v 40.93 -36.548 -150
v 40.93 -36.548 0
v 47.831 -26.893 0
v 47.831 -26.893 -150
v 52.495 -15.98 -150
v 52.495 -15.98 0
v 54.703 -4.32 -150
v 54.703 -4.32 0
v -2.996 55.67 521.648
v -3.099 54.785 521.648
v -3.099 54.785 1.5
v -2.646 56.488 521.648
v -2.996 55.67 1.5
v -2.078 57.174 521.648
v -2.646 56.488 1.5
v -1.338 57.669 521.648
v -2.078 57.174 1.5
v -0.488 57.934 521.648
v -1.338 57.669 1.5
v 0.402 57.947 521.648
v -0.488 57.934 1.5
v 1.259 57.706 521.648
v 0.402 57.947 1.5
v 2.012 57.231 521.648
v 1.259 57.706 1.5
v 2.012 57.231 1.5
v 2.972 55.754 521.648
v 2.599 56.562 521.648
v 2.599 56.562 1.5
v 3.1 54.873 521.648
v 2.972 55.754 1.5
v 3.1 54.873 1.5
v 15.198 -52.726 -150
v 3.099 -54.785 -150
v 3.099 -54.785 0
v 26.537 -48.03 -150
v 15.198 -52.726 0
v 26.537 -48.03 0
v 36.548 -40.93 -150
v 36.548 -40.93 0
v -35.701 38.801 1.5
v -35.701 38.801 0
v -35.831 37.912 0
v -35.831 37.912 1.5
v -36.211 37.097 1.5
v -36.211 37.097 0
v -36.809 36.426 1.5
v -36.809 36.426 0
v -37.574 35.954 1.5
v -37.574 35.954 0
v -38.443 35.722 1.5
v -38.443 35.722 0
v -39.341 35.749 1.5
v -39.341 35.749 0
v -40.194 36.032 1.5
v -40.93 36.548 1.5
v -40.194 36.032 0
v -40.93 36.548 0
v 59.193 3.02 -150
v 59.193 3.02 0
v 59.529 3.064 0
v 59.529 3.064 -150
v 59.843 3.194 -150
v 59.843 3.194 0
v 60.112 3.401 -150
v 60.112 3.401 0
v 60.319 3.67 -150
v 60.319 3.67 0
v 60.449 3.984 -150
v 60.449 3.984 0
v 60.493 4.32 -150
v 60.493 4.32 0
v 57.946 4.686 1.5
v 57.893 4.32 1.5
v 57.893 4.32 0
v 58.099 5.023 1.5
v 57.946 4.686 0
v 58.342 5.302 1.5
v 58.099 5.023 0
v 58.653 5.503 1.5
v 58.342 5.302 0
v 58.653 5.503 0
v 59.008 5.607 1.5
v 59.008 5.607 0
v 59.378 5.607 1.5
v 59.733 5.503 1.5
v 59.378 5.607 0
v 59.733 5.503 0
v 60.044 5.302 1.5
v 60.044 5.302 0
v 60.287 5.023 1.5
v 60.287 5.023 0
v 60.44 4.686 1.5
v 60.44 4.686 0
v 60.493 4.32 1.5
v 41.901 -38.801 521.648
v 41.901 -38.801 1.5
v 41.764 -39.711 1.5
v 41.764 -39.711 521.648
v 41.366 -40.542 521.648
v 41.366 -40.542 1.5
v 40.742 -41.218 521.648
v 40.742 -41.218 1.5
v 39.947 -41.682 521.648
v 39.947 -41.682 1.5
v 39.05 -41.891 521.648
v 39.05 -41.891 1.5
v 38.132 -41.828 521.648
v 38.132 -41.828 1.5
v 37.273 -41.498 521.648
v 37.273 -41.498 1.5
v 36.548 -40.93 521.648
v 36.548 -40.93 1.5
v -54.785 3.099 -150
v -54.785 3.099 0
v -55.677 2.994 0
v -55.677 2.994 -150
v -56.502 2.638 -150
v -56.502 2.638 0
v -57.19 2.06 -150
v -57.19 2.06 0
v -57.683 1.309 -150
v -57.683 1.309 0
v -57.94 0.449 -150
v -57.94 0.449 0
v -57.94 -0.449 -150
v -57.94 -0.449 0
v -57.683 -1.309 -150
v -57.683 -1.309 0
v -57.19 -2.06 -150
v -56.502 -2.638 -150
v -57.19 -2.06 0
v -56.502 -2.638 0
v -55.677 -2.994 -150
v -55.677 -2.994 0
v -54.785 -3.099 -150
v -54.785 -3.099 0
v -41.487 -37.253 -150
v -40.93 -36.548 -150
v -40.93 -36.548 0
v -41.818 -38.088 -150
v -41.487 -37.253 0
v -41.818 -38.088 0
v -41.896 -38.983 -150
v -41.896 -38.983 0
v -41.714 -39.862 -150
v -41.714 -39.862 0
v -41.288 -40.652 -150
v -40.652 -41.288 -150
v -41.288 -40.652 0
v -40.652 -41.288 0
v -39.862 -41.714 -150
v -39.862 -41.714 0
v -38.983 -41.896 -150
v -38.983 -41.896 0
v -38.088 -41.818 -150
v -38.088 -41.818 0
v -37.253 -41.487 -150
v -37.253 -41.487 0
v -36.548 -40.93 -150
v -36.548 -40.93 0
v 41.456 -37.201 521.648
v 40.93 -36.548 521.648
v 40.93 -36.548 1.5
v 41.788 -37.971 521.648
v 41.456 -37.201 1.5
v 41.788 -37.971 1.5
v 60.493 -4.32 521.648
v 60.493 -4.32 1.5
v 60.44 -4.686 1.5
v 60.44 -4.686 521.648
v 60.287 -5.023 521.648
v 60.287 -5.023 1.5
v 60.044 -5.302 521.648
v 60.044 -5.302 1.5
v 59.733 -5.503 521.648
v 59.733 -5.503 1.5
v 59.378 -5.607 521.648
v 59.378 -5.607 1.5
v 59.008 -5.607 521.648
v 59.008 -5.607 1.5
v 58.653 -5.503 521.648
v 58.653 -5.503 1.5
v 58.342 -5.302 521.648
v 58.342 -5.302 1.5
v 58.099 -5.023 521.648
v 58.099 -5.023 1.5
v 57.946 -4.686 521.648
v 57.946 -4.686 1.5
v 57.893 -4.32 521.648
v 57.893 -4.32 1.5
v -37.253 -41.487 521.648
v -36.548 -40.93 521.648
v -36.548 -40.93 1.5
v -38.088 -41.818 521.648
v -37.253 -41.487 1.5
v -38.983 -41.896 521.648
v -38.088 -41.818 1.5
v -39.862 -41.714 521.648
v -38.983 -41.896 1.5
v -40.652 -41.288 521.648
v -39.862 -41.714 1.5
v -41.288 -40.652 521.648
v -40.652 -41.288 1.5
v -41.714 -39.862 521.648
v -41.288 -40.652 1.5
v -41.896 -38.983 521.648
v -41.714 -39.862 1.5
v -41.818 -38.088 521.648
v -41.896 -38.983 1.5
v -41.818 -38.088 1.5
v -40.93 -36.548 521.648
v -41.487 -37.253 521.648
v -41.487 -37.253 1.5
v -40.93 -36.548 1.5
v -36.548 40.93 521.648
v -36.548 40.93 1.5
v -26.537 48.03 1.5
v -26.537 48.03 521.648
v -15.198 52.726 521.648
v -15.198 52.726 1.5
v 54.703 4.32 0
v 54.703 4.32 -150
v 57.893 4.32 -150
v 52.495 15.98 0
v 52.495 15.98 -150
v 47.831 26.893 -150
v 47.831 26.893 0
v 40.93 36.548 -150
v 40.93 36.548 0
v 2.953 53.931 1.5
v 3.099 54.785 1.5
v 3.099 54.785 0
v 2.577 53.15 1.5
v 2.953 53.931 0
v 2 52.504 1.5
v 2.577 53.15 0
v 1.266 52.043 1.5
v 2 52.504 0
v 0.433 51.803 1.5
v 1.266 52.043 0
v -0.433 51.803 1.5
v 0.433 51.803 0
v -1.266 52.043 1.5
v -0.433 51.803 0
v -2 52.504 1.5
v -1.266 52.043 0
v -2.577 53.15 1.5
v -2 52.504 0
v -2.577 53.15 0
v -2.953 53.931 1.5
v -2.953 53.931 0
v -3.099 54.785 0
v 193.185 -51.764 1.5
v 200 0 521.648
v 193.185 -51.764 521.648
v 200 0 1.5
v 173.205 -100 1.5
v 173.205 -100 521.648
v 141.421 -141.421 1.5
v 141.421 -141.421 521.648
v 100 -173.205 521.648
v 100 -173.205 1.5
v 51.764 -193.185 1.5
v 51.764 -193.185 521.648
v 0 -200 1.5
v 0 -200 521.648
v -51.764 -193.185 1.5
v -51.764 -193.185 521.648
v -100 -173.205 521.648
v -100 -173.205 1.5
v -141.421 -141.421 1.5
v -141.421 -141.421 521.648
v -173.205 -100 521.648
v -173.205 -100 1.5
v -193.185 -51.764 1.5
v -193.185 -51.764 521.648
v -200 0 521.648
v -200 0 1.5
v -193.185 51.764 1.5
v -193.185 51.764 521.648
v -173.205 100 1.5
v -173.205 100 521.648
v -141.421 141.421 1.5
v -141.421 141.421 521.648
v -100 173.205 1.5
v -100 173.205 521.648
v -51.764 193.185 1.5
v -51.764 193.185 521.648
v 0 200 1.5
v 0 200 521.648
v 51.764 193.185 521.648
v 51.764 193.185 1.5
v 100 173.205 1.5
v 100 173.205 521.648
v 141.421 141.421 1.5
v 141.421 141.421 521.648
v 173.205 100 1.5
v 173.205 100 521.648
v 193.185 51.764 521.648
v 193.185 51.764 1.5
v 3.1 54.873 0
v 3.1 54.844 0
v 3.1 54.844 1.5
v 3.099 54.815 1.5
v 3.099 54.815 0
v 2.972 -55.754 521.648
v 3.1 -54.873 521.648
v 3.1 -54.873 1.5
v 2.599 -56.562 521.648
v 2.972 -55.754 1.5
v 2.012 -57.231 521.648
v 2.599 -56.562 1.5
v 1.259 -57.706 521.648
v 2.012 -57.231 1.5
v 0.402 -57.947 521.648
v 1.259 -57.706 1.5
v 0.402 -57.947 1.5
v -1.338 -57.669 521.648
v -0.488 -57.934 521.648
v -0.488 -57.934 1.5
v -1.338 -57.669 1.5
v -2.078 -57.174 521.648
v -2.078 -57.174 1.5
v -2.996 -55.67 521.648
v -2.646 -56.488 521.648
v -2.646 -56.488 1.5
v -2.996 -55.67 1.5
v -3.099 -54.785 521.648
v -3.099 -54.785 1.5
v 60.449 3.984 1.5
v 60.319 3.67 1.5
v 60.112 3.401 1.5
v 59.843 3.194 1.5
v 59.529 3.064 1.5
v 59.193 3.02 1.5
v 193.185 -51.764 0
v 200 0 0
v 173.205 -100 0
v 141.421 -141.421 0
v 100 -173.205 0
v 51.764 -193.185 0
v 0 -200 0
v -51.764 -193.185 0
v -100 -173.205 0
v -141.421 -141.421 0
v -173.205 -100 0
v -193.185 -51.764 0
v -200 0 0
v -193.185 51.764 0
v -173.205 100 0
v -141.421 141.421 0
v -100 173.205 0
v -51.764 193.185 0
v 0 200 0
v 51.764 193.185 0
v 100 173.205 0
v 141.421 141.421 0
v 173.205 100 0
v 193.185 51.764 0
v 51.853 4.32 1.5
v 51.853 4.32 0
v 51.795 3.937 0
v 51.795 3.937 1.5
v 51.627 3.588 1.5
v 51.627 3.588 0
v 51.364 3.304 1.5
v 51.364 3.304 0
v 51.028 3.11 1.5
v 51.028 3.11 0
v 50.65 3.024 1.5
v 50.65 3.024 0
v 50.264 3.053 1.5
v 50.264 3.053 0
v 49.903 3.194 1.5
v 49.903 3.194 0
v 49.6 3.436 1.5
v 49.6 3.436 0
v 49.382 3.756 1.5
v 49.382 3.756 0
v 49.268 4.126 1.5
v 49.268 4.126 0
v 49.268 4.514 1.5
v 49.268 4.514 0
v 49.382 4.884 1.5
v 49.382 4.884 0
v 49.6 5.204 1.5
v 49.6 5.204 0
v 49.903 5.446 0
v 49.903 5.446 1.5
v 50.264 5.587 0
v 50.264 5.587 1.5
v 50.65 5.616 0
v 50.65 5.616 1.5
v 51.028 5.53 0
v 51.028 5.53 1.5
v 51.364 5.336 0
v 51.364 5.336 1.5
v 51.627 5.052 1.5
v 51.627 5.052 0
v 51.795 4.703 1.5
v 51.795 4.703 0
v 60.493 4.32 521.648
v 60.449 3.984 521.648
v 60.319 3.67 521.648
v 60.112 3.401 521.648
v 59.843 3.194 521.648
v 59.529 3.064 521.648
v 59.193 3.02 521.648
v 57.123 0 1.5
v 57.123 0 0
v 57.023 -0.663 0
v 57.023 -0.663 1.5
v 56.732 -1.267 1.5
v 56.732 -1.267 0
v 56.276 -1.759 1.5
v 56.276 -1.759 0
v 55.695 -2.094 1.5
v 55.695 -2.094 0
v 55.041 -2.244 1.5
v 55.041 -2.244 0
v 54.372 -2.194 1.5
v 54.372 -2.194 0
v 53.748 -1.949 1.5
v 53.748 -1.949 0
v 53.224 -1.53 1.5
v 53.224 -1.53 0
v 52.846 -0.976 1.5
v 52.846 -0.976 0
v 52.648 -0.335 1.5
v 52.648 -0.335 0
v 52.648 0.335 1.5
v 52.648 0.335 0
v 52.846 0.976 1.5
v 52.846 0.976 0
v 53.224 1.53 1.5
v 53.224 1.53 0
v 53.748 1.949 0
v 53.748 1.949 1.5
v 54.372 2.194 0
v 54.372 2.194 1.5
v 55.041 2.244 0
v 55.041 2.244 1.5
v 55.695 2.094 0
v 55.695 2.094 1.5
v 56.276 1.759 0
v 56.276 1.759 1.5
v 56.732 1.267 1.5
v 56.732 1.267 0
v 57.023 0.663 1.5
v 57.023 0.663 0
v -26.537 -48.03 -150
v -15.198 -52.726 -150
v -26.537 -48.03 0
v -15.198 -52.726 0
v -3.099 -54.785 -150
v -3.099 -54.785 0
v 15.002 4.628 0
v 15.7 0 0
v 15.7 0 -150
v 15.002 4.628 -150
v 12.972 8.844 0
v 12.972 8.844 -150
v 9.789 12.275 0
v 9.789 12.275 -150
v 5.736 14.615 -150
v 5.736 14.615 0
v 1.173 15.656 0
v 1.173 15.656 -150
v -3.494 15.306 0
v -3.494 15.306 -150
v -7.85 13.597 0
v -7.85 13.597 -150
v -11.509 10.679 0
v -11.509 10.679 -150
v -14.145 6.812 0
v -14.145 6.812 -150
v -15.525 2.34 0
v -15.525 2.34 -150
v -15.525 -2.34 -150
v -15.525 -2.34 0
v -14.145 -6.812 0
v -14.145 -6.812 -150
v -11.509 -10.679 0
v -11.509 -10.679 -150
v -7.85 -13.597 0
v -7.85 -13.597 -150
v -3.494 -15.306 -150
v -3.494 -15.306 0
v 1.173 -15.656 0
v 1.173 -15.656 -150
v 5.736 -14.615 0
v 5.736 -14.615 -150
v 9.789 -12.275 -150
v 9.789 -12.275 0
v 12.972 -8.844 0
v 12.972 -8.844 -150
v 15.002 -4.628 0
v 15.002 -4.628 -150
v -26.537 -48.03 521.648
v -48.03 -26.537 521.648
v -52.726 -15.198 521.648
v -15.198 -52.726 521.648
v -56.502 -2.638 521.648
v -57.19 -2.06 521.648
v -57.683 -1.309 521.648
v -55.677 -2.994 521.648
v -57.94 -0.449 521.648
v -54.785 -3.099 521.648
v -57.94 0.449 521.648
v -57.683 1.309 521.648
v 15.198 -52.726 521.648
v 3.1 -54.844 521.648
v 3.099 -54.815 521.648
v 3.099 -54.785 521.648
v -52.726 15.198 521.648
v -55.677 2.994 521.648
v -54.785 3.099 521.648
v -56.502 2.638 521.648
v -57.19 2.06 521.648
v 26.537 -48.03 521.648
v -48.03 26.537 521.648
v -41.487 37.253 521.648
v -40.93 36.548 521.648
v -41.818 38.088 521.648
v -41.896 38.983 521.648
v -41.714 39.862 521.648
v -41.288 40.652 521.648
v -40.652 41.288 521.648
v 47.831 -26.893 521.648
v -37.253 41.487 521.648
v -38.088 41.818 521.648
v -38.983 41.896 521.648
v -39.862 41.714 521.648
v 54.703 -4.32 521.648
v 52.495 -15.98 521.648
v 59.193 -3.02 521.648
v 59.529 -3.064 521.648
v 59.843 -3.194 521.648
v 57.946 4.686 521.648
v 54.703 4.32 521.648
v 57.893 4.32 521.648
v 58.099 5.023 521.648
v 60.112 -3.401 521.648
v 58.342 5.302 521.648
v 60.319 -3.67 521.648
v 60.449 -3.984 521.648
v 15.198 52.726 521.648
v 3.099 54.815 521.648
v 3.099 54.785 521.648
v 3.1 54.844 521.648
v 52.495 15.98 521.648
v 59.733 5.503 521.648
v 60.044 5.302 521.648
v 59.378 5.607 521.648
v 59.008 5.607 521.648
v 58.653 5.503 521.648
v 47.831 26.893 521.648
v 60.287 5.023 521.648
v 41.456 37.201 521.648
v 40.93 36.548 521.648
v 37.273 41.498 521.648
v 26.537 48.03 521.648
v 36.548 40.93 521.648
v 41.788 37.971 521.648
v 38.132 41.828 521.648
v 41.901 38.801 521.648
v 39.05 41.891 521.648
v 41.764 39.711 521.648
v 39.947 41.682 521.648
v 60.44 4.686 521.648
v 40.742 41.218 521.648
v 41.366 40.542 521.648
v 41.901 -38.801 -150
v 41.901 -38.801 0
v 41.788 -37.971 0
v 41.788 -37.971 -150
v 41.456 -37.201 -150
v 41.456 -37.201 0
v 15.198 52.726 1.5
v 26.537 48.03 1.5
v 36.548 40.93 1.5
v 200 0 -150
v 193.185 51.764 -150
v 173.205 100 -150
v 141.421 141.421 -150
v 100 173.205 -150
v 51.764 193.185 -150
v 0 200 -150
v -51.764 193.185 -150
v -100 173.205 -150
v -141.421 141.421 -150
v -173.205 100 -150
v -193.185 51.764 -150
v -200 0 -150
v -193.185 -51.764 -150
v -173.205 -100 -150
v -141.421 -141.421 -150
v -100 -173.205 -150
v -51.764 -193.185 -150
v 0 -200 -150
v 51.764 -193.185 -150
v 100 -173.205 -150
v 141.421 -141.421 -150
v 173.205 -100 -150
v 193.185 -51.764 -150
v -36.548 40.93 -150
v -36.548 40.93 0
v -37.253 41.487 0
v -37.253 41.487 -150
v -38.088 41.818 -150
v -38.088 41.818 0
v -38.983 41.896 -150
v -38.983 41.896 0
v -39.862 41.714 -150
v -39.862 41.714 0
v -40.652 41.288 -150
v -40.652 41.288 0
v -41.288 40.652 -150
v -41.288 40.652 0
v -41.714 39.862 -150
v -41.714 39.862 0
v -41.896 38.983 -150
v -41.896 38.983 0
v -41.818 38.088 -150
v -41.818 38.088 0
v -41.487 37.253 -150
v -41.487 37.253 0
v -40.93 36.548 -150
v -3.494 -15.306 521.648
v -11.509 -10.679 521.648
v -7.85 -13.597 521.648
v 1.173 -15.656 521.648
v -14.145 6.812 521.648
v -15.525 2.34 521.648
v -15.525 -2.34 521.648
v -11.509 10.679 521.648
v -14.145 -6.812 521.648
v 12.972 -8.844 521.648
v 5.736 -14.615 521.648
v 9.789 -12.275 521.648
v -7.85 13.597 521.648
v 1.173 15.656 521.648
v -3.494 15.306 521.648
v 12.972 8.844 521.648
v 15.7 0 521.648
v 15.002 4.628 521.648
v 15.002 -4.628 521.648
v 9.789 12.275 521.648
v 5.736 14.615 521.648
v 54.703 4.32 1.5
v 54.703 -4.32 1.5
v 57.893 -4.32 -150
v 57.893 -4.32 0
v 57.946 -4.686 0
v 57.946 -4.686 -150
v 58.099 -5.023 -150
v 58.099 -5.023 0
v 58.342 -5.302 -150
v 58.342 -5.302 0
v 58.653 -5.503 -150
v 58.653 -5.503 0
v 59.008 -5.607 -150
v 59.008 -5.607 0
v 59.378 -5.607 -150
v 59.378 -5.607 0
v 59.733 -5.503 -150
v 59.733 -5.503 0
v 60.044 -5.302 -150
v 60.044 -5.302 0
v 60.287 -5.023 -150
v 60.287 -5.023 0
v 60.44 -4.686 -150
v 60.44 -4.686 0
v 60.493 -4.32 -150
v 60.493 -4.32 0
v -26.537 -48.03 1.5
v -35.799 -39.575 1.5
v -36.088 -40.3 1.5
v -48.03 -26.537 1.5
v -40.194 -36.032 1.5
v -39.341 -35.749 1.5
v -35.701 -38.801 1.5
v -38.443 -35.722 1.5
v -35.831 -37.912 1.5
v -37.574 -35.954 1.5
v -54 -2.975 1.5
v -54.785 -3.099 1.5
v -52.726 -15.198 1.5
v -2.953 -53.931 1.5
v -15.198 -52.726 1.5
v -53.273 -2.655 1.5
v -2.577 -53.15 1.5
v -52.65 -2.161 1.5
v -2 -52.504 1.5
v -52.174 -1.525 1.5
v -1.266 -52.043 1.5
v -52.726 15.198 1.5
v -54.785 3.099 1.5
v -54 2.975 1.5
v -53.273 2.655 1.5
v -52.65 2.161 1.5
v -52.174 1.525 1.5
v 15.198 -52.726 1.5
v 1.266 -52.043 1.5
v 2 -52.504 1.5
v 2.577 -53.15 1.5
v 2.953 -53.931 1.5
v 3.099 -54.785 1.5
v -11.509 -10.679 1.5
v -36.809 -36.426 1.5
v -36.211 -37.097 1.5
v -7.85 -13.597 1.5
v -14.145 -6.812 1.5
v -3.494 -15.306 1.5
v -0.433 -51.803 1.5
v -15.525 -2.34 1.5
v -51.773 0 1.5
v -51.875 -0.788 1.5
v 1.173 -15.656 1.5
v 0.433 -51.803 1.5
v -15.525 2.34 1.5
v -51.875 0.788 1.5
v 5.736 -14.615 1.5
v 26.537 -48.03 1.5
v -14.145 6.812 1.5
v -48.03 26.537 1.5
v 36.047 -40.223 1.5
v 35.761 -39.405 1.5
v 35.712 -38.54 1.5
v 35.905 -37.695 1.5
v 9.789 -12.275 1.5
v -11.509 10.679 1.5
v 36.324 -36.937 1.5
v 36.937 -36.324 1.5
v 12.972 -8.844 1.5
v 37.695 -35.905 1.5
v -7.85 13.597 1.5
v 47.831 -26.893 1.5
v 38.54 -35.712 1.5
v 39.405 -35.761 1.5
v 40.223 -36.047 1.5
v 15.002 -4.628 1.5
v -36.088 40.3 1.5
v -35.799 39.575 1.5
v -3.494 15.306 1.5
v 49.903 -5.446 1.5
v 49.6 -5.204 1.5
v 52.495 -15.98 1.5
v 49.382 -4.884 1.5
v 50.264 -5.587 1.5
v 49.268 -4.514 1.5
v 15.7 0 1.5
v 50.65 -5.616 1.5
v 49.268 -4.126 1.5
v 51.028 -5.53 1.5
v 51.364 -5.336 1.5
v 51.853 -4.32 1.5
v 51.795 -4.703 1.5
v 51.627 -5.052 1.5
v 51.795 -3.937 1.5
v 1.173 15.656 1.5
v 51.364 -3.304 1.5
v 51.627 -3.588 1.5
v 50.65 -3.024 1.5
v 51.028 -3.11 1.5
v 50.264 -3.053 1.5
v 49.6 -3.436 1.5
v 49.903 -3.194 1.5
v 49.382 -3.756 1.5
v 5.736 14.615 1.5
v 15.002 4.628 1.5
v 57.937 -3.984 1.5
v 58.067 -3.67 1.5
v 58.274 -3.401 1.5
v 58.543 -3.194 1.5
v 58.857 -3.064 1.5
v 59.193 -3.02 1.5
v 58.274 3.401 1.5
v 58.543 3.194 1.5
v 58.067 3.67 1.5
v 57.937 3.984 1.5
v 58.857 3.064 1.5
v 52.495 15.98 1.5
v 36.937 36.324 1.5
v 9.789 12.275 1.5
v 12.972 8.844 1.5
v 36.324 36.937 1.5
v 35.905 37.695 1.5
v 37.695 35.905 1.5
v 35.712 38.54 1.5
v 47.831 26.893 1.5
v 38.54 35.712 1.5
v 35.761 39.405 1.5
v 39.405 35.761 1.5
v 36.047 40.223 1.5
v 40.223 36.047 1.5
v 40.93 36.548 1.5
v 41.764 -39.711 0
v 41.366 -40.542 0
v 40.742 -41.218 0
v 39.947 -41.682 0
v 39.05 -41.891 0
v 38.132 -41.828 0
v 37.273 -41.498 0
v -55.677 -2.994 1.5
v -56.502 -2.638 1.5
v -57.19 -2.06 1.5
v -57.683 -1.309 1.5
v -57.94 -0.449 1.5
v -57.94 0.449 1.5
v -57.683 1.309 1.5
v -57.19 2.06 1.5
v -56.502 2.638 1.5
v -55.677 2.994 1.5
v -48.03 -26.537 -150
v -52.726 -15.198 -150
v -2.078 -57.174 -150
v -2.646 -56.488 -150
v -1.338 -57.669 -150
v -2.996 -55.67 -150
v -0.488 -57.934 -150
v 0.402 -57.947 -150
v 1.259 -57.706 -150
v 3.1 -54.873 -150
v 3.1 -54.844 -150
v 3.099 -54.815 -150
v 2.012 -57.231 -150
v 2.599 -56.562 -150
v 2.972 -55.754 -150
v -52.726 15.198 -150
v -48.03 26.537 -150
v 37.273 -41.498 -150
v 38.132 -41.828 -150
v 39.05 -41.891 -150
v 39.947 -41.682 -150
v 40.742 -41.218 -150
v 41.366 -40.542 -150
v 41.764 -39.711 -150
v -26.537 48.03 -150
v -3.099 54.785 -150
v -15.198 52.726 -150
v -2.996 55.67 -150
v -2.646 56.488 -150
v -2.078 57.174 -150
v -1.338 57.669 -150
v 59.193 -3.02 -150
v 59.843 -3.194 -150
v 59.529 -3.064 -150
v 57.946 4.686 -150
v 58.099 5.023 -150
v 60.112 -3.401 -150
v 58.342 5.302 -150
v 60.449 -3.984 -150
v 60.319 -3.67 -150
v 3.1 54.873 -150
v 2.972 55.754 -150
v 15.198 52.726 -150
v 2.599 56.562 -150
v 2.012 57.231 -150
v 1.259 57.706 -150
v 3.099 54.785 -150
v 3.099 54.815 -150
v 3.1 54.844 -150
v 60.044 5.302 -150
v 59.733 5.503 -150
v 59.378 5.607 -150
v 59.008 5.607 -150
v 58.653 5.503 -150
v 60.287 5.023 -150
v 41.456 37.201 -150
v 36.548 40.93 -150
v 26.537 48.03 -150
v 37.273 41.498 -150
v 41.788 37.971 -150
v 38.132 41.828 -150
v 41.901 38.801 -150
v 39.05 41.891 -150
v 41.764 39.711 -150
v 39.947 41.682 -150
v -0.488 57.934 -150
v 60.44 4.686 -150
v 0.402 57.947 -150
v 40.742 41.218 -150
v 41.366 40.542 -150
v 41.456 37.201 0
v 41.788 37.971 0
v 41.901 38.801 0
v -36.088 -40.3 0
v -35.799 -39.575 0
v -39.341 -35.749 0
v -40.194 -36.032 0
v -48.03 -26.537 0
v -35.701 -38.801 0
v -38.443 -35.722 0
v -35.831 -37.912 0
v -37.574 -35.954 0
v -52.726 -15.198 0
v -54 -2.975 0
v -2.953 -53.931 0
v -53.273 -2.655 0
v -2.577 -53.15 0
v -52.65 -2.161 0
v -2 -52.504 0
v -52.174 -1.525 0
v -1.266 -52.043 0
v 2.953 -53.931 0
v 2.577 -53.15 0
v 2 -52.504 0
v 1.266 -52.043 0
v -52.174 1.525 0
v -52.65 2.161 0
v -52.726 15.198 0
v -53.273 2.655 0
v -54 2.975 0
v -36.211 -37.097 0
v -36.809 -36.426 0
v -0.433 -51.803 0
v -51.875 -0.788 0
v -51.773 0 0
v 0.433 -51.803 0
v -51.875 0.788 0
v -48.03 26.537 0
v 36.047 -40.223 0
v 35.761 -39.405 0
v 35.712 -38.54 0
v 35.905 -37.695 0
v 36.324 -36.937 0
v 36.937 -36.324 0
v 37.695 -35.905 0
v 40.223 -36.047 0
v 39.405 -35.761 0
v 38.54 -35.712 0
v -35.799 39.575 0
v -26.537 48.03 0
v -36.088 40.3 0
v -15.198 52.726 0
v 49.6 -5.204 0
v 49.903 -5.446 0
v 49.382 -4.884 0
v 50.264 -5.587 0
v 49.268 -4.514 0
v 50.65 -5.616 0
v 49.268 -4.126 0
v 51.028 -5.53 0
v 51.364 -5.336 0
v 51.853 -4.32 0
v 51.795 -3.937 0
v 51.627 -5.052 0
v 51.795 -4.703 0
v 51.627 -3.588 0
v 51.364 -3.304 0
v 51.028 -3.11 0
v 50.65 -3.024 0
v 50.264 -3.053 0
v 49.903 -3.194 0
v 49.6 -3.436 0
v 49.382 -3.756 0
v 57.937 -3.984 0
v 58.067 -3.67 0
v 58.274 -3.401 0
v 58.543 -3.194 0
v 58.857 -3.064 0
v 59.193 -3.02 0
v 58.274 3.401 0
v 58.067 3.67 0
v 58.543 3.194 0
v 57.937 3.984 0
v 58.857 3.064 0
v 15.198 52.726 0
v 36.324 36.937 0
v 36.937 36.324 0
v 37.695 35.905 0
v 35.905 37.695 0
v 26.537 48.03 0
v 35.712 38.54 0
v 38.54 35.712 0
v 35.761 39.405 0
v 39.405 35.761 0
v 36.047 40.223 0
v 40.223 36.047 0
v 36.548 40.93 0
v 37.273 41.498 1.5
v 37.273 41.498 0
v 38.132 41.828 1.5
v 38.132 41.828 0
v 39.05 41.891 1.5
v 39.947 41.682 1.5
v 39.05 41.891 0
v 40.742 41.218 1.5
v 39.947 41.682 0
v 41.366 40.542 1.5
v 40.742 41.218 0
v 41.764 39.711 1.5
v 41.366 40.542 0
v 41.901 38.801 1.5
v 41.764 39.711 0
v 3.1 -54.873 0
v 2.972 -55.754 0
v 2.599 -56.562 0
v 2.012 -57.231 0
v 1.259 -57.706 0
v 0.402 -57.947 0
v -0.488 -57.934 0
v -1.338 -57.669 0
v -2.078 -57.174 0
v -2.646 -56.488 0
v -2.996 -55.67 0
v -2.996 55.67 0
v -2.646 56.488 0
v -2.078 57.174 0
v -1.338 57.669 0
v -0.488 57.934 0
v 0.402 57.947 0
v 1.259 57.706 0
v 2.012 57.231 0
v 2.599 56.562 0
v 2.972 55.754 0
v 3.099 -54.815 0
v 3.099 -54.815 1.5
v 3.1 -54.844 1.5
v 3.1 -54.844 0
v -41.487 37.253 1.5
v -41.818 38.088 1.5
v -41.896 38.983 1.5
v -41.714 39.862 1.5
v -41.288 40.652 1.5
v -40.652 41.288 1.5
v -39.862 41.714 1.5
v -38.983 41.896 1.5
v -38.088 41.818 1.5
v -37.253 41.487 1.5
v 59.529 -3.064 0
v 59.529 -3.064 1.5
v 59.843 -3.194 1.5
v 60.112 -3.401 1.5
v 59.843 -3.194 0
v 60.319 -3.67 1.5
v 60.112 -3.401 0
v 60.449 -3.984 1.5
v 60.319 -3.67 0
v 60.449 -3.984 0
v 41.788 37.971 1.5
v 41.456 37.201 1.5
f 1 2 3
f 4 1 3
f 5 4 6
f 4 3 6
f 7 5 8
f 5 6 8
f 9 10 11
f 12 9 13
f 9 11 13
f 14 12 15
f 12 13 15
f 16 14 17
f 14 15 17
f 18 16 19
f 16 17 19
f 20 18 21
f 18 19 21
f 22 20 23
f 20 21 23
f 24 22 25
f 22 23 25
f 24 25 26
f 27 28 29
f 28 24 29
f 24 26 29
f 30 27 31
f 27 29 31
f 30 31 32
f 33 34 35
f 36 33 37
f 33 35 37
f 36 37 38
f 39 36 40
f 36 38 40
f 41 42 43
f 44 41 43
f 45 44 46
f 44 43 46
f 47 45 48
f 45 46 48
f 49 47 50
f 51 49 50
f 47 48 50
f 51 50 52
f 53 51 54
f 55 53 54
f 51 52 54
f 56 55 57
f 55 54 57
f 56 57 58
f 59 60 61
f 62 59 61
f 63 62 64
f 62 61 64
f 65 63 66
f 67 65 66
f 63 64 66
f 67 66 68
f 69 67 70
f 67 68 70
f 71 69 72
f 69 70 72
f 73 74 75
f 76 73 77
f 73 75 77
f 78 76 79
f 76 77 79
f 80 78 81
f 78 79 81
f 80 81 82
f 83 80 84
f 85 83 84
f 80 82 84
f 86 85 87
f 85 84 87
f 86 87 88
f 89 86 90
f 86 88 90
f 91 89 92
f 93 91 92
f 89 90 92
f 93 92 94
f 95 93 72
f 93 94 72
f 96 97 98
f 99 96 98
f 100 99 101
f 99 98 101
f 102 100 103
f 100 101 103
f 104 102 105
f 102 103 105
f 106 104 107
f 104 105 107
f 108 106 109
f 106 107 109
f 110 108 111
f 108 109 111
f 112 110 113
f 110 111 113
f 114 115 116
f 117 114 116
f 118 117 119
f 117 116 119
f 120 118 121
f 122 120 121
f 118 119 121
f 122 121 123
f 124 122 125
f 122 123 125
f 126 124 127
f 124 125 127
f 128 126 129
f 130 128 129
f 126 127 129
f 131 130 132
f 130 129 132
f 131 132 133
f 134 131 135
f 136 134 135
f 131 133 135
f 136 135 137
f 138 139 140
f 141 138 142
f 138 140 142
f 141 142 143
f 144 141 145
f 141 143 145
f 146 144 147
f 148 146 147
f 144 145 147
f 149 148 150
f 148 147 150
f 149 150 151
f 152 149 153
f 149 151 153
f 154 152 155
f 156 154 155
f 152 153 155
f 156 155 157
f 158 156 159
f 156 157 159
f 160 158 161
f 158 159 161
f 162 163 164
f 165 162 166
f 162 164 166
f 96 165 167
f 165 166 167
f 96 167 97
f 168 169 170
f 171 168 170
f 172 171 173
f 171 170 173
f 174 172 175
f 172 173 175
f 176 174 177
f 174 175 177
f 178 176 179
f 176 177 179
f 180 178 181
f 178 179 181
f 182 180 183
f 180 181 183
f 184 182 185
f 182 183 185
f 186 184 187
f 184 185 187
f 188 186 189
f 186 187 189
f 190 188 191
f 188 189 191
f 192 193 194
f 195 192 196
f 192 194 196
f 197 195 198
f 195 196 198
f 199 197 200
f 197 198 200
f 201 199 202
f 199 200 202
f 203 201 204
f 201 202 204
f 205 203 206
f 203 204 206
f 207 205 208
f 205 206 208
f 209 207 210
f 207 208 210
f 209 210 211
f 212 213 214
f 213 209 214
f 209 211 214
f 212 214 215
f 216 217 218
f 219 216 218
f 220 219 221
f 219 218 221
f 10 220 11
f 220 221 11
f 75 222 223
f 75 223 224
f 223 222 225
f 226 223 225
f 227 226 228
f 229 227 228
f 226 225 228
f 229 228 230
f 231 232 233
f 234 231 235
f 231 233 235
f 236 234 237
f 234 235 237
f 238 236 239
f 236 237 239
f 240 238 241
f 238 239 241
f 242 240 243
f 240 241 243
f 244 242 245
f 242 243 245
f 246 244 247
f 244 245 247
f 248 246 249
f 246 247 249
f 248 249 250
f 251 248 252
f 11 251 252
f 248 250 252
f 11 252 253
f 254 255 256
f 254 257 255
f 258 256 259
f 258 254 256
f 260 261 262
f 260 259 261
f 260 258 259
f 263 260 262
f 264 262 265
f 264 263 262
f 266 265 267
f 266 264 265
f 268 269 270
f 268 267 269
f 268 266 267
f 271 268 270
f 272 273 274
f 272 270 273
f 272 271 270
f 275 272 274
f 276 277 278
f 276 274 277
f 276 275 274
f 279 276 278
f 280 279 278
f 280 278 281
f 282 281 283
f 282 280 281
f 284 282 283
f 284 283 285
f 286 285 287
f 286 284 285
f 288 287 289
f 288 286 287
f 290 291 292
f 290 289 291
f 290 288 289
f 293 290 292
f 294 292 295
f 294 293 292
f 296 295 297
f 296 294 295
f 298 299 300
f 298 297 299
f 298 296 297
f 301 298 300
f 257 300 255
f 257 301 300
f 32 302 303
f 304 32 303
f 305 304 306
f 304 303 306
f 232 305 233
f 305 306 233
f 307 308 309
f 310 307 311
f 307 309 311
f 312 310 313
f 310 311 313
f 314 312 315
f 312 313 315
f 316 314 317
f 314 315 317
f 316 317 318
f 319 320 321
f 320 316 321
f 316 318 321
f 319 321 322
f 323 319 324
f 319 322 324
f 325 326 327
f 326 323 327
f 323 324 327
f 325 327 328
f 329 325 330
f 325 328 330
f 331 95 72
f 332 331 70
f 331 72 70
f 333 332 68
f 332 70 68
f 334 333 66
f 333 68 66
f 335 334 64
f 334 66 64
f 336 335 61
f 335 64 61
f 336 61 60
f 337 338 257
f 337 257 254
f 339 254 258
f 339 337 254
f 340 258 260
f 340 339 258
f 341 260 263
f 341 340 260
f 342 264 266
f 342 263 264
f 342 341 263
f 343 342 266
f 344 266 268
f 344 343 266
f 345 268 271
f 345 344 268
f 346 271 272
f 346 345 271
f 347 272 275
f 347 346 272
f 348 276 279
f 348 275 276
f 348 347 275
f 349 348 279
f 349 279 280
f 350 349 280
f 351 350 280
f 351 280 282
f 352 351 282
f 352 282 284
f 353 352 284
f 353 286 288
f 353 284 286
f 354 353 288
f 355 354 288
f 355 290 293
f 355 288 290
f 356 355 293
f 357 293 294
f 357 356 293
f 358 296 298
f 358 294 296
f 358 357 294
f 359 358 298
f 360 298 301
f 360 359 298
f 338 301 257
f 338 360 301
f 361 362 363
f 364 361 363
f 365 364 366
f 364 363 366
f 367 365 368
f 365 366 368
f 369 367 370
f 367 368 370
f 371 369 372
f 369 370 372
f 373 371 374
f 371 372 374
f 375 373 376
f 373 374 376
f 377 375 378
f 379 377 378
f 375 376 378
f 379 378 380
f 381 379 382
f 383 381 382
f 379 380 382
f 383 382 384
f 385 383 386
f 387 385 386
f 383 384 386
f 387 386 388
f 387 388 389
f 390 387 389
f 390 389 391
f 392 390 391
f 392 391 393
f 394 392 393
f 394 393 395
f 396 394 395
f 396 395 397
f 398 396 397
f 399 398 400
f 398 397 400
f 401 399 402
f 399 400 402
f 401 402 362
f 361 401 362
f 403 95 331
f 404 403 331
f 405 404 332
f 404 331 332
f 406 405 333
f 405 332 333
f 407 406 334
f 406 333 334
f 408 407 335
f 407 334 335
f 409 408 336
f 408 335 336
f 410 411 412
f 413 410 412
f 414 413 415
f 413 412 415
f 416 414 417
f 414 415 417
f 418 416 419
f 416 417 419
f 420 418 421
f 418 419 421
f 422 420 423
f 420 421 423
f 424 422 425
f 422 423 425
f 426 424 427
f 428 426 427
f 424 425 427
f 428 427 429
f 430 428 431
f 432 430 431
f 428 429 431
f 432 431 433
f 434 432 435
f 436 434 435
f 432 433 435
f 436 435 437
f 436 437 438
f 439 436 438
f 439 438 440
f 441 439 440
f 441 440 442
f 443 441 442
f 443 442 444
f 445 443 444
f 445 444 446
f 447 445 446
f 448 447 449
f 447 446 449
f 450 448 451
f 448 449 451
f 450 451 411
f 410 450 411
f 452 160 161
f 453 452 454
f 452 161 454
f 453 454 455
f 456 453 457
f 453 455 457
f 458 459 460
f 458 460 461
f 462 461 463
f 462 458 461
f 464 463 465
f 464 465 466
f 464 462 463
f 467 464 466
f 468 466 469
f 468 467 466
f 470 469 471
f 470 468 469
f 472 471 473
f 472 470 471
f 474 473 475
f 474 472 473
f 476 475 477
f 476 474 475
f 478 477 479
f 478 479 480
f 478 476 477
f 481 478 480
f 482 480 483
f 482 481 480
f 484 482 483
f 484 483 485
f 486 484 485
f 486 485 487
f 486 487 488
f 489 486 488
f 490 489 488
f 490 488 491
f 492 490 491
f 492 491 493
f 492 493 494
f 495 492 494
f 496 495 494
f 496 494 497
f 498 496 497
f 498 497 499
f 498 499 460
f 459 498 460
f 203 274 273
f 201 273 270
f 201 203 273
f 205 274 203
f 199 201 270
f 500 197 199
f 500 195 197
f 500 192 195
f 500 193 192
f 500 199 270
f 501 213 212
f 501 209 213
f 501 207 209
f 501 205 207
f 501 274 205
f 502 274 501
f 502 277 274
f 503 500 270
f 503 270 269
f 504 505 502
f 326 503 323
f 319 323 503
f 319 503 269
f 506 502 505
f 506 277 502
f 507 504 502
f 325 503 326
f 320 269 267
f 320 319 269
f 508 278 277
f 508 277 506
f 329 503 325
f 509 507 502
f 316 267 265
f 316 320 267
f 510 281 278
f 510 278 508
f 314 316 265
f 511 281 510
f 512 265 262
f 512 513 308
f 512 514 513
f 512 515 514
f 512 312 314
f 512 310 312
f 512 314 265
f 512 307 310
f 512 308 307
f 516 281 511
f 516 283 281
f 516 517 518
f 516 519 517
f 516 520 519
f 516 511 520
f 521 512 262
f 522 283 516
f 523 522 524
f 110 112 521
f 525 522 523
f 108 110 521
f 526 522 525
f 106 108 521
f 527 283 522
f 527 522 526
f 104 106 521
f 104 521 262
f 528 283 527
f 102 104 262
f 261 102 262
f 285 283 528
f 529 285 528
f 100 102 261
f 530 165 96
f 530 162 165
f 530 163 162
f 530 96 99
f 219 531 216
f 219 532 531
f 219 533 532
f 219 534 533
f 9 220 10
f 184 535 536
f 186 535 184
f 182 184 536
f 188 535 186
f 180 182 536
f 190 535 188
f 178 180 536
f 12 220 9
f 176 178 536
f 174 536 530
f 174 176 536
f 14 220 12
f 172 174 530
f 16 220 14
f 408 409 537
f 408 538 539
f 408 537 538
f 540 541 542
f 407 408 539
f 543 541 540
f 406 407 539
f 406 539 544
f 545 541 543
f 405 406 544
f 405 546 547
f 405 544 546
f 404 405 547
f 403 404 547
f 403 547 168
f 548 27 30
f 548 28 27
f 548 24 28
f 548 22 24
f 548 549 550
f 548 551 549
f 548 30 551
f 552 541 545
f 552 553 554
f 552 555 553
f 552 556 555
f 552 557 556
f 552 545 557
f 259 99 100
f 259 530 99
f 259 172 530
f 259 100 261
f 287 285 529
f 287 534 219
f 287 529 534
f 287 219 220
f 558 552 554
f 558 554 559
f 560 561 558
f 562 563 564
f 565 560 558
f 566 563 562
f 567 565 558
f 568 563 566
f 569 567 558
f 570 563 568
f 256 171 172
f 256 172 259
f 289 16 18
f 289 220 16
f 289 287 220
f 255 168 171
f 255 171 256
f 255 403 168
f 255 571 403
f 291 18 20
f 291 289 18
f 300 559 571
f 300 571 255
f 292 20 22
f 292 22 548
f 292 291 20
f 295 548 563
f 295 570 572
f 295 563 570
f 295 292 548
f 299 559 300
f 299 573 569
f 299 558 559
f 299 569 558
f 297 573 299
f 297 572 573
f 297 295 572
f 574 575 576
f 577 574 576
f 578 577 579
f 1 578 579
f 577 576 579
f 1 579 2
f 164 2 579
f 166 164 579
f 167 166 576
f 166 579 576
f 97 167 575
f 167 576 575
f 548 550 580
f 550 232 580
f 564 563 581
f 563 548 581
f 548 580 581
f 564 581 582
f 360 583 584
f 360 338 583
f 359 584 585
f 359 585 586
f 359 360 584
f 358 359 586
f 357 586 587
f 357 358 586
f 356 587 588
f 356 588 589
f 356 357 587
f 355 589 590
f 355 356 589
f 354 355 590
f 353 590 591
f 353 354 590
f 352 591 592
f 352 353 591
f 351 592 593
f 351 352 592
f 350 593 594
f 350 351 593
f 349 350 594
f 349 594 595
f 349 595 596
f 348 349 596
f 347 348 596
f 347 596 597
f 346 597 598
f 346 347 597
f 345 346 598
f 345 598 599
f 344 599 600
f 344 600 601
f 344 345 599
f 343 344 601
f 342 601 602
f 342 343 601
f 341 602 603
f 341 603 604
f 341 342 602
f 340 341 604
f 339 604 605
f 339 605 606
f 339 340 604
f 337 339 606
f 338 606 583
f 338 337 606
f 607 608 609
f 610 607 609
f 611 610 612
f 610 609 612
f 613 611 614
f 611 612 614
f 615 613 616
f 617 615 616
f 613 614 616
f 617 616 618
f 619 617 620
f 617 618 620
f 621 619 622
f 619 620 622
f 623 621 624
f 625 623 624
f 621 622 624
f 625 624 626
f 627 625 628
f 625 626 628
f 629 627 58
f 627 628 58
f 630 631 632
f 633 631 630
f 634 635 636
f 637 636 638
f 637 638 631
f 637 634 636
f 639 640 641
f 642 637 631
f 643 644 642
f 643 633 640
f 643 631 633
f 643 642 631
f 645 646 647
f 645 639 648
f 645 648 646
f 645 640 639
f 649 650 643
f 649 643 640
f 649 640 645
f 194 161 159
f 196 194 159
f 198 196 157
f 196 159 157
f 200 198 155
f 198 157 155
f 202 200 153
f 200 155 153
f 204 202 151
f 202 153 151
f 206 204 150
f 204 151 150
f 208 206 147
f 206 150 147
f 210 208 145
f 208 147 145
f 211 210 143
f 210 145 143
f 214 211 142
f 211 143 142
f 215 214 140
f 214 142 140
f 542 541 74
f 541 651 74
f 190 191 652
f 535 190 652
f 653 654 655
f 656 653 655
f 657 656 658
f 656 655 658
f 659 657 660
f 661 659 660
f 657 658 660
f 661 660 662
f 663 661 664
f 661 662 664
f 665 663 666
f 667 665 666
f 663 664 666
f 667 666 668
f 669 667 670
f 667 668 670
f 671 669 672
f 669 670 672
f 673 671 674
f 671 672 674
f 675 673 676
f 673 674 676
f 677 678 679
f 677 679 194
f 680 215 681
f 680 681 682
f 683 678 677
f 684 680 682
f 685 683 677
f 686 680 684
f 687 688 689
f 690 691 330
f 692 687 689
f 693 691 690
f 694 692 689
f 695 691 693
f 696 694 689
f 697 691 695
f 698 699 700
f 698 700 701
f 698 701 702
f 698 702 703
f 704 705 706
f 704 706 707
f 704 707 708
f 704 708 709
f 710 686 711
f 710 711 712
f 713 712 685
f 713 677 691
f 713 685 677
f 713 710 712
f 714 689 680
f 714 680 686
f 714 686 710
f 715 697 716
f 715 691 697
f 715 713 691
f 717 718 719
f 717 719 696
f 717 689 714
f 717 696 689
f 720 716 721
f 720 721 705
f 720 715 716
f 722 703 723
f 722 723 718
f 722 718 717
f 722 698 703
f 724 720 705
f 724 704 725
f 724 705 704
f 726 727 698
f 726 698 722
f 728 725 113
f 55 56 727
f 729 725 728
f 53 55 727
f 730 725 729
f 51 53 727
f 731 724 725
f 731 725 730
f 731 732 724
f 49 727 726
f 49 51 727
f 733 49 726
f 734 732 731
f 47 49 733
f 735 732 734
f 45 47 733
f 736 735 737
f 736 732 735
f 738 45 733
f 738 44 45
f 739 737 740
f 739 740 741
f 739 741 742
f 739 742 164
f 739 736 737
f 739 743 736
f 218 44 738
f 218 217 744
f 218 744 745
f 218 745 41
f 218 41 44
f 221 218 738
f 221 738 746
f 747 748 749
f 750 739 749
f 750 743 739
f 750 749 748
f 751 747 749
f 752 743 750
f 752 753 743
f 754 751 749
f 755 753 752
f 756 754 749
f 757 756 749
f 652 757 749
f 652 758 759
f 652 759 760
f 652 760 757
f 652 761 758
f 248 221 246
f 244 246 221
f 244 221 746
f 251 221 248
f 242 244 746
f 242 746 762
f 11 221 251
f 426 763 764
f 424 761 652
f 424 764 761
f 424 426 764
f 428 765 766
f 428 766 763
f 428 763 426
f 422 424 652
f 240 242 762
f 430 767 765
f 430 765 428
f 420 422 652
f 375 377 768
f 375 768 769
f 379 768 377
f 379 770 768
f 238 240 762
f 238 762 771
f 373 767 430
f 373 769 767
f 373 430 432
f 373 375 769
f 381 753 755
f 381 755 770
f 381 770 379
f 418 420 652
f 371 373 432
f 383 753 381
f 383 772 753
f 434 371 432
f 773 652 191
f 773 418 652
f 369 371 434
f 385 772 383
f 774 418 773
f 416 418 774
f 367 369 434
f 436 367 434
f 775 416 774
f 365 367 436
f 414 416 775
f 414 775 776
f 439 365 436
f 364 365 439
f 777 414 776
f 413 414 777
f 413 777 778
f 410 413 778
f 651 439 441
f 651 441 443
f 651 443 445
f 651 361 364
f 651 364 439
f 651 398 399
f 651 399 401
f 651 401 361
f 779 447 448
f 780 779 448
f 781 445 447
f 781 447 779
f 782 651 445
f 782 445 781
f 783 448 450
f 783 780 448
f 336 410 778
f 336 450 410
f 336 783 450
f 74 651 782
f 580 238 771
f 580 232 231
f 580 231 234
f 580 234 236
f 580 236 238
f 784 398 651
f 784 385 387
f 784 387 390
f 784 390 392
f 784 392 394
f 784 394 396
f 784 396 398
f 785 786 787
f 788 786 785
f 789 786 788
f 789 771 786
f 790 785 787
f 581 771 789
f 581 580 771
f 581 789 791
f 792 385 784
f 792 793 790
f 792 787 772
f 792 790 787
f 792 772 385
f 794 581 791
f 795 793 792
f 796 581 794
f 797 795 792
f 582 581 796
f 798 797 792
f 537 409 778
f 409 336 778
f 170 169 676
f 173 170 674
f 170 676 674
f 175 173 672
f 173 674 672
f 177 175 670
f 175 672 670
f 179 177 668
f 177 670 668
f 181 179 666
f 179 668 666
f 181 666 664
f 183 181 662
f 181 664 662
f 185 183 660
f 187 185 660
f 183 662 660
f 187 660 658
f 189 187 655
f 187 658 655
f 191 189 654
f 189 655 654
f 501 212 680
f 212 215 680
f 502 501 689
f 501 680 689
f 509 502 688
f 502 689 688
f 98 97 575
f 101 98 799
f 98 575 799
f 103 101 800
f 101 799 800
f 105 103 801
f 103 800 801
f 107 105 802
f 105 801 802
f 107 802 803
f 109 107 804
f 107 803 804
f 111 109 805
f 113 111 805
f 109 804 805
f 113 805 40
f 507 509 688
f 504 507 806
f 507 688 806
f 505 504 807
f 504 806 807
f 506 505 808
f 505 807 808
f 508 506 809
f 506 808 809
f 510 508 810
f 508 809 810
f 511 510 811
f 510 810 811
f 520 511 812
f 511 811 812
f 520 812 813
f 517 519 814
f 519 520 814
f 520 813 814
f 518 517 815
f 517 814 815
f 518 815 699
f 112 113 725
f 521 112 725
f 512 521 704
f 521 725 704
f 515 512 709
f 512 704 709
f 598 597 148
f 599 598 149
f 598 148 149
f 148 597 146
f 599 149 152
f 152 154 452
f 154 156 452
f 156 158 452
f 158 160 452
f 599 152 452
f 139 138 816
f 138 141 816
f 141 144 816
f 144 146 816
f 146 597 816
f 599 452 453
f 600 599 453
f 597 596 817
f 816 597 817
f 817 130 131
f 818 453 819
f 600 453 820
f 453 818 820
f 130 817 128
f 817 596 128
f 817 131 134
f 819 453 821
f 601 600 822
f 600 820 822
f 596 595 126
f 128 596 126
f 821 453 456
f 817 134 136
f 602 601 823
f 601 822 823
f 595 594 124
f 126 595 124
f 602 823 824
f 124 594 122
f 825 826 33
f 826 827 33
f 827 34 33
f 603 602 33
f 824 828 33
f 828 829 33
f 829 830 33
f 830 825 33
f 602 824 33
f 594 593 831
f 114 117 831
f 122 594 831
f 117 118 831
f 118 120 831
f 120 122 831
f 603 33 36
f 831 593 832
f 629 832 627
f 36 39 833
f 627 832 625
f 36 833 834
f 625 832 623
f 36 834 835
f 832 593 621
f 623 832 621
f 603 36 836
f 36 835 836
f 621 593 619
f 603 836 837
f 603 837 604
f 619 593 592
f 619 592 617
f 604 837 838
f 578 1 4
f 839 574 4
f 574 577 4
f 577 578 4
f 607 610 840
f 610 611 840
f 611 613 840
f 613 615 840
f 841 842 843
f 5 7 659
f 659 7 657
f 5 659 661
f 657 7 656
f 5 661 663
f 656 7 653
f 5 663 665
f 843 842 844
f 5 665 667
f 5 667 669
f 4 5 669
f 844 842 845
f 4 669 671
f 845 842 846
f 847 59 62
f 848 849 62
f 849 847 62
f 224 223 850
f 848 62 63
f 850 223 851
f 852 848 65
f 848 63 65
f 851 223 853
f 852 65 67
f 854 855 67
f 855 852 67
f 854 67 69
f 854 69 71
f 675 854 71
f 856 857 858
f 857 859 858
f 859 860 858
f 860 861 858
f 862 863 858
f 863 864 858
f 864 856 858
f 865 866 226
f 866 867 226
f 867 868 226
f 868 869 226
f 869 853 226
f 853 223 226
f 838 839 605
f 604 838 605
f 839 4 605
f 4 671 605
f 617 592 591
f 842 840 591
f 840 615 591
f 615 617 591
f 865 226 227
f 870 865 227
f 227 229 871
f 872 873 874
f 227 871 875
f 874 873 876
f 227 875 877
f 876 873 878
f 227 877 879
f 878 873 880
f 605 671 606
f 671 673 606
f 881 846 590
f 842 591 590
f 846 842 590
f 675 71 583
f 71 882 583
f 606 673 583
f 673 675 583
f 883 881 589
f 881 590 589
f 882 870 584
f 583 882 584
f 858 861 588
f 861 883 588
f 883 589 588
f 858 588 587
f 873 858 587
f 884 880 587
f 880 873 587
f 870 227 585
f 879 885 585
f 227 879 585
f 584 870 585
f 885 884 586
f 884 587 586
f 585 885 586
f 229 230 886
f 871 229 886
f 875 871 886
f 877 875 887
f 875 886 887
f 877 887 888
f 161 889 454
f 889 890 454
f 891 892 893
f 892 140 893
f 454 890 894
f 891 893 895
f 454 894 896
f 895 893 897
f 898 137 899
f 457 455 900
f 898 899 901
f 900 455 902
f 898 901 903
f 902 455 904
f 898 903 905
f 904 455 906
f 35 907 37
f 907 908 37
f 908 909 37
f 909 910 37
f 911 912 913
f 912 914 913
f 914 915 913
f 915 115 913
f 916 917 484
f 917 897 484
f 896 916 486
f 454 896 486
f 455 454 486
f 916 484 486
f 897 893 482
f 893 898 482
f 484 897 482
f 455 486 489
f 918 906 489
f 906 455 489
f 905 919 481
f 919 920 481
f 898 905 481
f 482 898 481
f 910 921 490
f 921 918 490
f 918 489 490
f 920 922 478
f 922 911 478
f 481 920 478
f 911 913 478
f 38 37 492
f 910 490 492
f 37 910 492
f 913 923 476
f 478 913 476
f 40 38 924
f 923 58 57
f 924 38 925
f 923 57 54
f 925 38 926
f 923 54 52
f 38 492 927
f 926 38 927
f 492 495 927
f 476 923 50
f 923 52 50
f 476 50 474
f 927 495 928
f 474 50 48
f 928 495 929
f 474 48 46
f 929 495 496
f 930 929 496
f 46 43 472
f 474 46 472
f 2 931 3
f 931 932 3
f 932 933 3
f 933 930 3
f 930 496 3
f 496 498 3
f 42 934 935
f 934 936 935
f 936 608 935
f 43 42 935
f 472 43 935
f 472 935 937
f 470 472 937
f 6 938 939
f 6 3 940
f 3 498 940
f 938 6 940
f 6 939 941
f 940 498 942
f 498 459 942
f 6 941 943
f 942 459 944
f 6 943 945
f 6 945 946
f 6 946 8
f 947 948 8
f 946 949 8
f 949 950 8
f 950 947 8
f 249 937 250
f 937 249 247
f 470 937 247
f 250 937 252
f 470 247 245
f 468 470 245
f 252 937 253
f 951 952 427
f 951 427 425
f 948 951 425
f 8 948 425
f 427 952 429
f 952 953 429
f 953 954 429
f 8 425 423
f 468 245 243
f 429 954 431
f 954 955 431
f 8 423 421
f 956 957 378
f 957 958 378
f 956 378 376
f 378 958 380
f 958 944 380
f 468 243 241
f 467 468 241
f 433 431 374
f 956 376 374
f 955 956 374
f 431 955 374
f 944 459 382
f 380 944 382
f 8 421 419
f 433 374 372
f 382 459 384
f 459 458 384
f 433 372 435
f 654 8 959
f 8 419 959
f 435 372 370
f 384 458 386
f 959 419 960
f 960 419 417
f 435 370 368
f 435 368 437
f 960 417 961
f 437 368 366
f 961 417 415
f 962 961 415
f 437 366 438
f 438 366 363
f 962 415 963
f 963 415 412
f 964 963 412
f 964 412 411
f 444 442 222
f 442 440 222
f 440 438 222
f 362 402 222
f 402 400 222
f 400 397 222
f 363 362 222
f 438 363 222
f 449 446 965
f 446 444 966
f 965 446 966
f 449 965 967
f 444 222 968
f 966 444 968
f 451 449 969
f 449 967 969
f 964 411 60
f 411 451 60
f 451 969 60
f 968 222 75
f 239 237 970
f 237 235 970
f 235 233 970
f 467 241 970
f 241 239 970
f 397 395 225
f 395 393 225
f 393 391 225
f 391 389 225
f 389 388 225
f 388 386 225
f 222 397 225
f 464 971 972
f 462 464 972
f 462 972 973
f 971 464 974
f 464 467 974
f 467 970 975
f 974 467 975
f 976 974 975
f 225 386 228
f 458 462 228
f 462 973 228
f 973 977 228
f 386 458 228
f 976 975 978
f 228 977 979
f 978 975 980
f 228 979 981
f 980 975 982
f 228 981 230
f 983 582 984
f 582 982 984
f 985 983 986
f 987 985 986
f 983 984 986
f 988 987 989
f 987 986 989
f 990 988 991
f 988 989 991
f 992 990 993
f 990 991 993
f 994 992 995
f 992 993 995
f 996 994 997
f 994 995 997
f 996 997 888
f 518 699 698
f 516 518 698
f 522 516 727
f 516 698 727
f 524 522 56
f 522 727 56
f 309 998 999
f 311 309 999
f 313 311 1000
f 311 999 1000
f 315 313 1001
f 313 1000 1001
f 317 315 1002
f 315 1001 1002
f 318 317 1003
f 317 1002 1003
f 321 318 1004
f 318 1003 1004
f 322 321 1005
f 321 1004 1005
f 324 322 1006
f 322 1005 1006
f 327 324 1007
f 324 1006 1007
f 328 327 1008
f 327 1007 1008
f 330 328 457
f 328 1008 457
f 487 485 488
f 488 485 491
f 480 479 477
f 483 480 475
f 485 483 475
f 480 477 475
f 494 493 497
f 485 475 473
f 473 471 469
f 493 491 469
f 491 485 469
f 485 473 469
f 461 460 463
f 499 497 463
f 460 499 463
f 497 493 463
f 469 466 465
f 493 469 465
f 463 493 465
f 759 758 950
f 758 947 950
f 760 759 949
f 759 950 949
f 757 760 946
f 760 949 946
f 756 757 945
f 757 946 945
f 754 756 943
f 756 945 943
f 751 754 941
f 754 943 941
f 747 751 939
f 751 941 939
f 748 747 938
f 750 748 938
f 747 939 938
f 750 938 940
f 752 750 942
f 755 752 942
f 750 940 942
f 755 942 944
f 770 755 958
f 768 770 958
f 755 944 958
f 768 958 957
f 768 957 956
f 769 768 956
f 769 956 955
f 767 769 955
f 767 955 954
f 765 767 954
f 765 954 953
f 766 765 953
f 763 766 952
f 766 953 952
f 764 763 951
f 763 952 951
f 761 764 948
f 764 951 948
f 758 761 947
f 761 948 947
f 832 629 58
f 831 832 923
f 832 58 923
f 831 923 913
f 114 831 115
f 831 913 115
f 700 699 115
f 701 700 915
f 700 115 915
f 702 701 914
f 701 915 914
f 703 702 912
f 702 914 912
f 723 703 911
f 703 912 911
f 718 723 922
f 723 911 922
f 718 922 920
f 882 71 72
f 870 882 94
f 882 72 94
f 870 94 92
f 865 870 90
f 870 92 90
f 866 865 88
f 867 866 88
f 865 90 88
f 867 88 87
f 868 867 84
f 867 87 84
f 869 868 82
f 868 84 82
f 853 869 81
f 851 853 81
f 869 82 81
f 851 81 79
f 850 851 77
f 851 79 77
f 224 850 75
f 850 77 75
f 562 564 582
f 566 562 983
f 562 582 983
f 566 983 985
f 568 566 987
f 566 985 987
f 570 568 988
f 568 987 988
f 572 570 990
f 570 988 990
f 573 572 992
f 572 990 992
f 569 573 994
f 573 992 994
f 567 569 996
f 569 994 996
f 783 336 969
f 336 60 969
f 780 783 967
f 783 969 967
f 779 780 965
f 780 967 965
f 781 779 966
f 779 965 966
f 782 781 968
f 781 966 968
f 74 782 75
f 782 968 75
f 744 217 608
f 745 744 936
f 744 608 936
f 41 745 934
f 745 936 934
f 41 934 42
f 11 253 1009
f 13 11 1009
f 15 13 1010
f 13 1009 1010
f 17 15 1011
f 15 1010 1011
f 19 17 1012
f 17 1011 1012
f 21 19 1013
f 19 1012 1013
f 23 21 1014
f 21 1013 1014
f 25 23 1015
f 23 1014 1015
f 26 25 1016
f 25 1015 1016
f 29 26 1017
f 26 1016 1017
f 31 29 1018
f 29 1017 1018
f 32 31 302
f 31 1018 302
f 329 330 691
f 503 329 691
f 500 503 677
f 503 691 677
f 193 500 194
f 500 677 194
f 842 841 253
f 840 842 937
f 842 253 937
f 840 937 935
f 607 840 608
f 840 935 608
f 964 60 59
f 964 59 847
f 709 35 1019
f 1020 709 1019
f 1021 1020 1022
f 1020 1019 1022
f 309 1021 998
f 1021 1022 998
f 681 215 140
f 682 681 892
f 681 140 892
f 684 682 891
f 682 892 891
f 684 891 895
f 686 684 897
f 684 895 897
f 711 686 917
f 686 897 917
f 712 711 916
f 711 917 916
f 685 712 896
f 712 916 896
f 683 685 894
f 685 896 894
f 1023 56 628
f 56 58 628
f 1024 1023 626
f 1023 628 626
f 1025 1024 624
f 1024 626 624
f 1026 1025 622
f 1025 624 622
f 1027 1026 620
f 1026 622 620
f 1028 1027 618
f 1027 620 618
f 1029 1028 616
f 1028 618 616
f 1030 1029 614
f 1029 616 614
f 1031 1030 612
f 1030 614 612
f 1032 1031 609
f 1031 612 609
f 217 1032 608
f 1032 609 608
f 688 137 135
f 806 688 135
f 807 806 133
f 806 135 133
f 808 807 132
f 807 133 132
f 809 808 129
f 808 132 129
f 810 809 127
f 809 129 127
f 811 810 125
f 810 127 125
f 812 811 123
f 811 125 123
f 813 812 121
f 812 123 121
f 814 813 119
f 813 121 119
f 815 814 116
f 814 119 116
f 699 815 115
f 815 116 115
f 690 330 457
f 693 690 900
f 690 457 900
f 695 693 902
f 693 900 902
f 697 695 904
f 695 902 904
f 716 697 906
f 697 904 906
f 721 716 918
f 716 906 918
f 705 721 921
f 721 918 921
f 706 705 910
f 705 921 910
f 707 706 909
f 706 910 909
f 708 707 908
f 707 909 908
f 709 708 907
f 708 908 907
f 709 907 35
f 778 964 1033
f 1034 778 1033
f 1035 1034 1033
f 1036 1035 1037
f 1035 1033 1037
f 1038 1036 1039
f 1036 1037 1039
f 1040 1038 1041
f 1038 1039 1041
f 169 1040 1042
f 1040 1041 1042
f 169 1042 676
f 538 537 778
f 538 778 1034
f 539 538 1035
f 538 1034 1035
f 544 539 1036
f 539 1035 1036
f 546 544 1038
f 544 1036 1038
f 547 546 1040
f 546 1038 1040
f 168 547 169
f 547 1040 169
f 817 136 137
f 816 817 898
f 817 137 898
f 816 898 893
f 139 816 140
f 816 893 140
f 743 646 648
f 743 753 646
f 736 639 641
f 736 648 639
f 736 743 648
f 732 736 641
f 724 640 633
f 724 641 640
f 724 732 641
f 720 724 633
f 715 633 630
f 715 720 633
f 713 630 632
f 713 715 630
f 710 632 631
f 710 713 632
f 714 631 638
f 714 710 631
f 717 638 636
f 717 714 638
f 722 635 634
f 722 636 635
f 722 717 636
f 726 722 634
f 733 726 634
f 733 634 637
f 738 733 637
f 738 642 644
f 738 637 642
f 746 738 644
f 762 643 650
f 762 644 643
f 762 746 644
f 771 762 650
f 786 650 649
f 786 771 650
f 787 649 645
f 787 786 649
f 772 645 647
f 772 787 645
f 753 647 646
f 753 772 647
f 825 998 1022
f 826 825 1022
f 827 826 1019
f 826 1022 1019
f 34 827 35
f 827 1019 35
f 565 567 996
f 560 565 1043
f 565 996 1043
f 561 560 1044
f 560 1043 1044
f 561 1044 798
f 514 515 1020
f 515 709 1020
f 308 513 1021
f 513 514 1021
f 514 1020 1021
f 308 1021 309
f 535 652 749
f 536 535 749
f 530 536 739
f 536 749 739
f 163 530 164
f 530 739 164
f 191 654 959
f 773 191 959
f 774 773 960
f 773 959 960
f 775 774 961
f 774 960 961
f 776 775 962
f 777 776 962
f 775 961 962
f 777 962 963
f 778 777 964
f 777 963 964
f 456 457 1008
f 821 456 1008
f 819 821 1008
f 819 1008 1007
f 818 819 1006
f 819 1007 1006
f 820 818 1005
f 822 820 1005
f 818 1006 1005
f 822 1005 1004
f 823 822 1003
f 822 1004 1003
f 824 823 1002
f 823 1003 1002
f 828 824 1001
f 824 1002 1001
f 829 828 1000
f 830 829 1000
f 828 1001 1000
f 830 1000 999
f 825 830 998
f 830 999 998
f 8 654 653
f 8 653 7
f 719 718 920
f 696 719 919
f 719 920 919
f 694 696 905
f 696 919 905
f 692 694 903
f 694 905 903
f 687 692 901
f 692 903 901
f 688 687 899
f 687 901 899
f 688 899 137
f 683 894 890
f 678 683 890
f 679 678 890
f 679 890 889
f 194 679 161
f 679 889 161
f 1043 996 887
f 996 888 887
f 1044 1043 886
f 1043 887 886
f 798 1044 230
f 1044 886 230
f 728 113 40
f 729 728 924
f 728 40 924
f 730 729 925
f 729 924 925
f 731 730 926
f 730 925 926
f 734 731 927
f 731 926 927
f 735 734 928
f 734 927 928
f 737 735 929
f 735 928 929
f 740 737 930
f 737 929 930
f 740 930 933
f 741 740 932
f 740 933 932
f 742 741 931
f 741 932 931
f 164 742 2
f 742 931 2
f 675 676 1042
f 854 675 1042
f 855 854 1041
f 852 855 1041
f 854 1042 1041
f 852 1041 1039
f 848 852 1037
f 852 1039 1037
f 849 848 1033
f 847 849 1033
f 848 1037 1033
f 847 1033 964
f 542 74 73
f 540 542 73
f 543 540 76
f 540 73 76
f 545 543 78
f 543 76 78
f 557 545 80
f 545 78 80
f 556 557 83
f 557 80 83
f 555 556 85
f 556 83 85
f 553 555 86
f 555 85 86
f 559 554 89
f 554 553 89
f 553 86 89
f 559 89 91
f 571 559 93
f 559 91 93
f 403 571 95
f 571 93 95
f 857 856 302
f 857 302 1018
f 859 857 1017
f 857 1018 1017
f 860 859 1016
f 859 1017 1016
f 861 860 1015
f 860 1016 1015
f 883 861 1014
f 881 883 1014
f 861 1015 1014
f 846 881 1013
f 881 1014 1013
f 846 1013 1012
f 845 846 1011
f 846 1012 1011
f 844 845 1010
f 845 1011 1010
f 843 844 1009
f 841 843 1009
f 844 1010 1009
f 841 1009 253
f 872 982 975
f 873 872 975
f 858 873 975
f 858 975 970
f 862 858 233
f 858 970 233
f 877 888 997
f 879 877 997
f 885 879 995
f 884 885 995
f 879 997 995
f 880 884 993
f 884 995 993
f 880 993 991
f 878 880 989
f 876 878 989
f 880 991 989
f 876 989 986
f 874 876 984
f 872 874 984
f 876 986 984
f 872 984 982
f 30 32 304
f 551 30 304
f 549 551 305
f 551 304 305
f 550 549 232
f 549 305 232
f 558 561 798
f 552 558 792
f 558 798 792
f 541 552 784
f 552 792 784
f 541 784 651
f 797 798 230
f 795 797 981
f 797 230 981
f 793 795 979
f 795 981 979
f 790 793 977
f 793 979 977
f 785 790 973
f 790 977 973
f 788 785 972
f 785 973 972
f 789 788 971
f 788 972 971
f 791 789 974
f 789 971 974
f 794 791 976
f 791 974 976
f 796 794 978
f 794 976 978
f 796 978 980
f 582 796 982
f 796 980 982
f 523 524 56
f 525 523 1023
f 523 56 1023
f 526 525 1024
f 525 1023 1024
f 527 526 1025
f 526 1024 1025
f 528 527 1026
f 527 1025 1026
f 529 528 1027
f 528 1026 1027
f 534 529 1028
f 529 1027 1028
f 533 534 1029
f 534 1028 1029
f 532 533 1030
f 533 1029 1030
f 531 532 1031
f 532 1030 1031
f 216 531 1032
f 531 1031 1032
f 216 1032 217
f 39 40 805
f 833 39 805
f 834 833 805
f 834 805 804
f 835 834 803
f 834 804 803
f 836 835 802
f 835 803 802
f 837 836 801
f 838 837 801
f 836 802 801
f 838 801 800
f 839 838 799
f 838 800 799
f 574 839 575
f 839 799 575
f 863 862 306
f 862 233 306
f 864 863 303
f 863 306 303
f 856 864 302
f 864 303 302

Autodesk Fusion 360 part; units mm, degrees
sketch "Skizze1" plane through (0, 0, 0) normal (0, 0, 1) x (1, 0, 0)
  circle A0 centre (0, 0) radius 14
  circle A1 centre (0, 0) radius 15.5
  dimension "d1" = 28
  dimension "d2" = 31
extrude "Extrusion1" add sketch "Skizze1" along normal blind 521.6482 and the other way blind 150
equation "d3 = 40 mm + ( 13.25 * 36.2376 ) * 1 mm + 4.5 mm - 3 mm"

Autodesk Fusion 360 part; units mm, degrees
sketch "Skizze1" plane through (0, 0, 0) normal (0, 0, 1) x (1, 0, 0)
  circle A0 centre (0, 0) radius 200
  circle A1 centre (0, 0) radius 15.7
  circle A2 centre (0, 0) radius 54.873
  line L0 (50.553, -4.32) -> (50.553, 4.32)
  circle A3 centre (50.553, -4.32) radius 1.3
  circle A4 centre (59.193, -4.32) radius 1.3
  line L1 (50.553, -4.32) -> (59.193, 4.32) construction
  line L2 (50.553, 4.32) -> (59.193, 4.32)
  line L3 (59.193, -4.32) -> (50.553, 4.32) construction
  line L4 (59.193, 4.32) -> (59.193, -4.32)
  circle A5 centre (50.553, 4.32) radius 1.3
  circle A6 centre (54.873, 0) radius 2.25
  line L5 (59.193, -4.32) -> (50.553, -4.32)
  circle A7 centre (59.193, 4.32) radius 1.3
  circle A8 centre (-54.873, 0) radius 3.1
  circle A9 centre (38.8011, 38.8011) radius 3.1
  circle A10 centre (0, 54.873) radius 3.1
  circle A11 centre (-38.8011, 38.8011) radius 3.1
  circle A12 centre (-38.8011, -38.8011) radius 3.1
  circle A13 centre (0, -54.873) radius 3.1
  circle A14 centre (38.8011, -38.8011) radius 3.1
  point P0 (54.873, 0)
  point P1 (54.873, 0)
  dimension "d1" = 400
  dimension "d2" = 31.4
  dimension "d3" = 109.746
  dimension "d6" = 4.5
  dimension "d7" = 8.64
  dimension "d8" = 8.64
  dimension "d9" = 2.6
  dimension "d10" = 2.6
  dimension "d11" = 2.6
  dimension "d12" = 2.6
  dimension "d13" = 6.2
  dimension "d15" = 270
extrude "Extrusion1" add sketch "Skizze1" along normal blind 1.5 contours A0 | A2 L0 A3 L2 A5 A6 L5 | A2 A4 L2 L4 A6 L5 A7 | A2 L0 A3 L2 A5 L5 A8 A9 A10 A11 A12 A13 A14
